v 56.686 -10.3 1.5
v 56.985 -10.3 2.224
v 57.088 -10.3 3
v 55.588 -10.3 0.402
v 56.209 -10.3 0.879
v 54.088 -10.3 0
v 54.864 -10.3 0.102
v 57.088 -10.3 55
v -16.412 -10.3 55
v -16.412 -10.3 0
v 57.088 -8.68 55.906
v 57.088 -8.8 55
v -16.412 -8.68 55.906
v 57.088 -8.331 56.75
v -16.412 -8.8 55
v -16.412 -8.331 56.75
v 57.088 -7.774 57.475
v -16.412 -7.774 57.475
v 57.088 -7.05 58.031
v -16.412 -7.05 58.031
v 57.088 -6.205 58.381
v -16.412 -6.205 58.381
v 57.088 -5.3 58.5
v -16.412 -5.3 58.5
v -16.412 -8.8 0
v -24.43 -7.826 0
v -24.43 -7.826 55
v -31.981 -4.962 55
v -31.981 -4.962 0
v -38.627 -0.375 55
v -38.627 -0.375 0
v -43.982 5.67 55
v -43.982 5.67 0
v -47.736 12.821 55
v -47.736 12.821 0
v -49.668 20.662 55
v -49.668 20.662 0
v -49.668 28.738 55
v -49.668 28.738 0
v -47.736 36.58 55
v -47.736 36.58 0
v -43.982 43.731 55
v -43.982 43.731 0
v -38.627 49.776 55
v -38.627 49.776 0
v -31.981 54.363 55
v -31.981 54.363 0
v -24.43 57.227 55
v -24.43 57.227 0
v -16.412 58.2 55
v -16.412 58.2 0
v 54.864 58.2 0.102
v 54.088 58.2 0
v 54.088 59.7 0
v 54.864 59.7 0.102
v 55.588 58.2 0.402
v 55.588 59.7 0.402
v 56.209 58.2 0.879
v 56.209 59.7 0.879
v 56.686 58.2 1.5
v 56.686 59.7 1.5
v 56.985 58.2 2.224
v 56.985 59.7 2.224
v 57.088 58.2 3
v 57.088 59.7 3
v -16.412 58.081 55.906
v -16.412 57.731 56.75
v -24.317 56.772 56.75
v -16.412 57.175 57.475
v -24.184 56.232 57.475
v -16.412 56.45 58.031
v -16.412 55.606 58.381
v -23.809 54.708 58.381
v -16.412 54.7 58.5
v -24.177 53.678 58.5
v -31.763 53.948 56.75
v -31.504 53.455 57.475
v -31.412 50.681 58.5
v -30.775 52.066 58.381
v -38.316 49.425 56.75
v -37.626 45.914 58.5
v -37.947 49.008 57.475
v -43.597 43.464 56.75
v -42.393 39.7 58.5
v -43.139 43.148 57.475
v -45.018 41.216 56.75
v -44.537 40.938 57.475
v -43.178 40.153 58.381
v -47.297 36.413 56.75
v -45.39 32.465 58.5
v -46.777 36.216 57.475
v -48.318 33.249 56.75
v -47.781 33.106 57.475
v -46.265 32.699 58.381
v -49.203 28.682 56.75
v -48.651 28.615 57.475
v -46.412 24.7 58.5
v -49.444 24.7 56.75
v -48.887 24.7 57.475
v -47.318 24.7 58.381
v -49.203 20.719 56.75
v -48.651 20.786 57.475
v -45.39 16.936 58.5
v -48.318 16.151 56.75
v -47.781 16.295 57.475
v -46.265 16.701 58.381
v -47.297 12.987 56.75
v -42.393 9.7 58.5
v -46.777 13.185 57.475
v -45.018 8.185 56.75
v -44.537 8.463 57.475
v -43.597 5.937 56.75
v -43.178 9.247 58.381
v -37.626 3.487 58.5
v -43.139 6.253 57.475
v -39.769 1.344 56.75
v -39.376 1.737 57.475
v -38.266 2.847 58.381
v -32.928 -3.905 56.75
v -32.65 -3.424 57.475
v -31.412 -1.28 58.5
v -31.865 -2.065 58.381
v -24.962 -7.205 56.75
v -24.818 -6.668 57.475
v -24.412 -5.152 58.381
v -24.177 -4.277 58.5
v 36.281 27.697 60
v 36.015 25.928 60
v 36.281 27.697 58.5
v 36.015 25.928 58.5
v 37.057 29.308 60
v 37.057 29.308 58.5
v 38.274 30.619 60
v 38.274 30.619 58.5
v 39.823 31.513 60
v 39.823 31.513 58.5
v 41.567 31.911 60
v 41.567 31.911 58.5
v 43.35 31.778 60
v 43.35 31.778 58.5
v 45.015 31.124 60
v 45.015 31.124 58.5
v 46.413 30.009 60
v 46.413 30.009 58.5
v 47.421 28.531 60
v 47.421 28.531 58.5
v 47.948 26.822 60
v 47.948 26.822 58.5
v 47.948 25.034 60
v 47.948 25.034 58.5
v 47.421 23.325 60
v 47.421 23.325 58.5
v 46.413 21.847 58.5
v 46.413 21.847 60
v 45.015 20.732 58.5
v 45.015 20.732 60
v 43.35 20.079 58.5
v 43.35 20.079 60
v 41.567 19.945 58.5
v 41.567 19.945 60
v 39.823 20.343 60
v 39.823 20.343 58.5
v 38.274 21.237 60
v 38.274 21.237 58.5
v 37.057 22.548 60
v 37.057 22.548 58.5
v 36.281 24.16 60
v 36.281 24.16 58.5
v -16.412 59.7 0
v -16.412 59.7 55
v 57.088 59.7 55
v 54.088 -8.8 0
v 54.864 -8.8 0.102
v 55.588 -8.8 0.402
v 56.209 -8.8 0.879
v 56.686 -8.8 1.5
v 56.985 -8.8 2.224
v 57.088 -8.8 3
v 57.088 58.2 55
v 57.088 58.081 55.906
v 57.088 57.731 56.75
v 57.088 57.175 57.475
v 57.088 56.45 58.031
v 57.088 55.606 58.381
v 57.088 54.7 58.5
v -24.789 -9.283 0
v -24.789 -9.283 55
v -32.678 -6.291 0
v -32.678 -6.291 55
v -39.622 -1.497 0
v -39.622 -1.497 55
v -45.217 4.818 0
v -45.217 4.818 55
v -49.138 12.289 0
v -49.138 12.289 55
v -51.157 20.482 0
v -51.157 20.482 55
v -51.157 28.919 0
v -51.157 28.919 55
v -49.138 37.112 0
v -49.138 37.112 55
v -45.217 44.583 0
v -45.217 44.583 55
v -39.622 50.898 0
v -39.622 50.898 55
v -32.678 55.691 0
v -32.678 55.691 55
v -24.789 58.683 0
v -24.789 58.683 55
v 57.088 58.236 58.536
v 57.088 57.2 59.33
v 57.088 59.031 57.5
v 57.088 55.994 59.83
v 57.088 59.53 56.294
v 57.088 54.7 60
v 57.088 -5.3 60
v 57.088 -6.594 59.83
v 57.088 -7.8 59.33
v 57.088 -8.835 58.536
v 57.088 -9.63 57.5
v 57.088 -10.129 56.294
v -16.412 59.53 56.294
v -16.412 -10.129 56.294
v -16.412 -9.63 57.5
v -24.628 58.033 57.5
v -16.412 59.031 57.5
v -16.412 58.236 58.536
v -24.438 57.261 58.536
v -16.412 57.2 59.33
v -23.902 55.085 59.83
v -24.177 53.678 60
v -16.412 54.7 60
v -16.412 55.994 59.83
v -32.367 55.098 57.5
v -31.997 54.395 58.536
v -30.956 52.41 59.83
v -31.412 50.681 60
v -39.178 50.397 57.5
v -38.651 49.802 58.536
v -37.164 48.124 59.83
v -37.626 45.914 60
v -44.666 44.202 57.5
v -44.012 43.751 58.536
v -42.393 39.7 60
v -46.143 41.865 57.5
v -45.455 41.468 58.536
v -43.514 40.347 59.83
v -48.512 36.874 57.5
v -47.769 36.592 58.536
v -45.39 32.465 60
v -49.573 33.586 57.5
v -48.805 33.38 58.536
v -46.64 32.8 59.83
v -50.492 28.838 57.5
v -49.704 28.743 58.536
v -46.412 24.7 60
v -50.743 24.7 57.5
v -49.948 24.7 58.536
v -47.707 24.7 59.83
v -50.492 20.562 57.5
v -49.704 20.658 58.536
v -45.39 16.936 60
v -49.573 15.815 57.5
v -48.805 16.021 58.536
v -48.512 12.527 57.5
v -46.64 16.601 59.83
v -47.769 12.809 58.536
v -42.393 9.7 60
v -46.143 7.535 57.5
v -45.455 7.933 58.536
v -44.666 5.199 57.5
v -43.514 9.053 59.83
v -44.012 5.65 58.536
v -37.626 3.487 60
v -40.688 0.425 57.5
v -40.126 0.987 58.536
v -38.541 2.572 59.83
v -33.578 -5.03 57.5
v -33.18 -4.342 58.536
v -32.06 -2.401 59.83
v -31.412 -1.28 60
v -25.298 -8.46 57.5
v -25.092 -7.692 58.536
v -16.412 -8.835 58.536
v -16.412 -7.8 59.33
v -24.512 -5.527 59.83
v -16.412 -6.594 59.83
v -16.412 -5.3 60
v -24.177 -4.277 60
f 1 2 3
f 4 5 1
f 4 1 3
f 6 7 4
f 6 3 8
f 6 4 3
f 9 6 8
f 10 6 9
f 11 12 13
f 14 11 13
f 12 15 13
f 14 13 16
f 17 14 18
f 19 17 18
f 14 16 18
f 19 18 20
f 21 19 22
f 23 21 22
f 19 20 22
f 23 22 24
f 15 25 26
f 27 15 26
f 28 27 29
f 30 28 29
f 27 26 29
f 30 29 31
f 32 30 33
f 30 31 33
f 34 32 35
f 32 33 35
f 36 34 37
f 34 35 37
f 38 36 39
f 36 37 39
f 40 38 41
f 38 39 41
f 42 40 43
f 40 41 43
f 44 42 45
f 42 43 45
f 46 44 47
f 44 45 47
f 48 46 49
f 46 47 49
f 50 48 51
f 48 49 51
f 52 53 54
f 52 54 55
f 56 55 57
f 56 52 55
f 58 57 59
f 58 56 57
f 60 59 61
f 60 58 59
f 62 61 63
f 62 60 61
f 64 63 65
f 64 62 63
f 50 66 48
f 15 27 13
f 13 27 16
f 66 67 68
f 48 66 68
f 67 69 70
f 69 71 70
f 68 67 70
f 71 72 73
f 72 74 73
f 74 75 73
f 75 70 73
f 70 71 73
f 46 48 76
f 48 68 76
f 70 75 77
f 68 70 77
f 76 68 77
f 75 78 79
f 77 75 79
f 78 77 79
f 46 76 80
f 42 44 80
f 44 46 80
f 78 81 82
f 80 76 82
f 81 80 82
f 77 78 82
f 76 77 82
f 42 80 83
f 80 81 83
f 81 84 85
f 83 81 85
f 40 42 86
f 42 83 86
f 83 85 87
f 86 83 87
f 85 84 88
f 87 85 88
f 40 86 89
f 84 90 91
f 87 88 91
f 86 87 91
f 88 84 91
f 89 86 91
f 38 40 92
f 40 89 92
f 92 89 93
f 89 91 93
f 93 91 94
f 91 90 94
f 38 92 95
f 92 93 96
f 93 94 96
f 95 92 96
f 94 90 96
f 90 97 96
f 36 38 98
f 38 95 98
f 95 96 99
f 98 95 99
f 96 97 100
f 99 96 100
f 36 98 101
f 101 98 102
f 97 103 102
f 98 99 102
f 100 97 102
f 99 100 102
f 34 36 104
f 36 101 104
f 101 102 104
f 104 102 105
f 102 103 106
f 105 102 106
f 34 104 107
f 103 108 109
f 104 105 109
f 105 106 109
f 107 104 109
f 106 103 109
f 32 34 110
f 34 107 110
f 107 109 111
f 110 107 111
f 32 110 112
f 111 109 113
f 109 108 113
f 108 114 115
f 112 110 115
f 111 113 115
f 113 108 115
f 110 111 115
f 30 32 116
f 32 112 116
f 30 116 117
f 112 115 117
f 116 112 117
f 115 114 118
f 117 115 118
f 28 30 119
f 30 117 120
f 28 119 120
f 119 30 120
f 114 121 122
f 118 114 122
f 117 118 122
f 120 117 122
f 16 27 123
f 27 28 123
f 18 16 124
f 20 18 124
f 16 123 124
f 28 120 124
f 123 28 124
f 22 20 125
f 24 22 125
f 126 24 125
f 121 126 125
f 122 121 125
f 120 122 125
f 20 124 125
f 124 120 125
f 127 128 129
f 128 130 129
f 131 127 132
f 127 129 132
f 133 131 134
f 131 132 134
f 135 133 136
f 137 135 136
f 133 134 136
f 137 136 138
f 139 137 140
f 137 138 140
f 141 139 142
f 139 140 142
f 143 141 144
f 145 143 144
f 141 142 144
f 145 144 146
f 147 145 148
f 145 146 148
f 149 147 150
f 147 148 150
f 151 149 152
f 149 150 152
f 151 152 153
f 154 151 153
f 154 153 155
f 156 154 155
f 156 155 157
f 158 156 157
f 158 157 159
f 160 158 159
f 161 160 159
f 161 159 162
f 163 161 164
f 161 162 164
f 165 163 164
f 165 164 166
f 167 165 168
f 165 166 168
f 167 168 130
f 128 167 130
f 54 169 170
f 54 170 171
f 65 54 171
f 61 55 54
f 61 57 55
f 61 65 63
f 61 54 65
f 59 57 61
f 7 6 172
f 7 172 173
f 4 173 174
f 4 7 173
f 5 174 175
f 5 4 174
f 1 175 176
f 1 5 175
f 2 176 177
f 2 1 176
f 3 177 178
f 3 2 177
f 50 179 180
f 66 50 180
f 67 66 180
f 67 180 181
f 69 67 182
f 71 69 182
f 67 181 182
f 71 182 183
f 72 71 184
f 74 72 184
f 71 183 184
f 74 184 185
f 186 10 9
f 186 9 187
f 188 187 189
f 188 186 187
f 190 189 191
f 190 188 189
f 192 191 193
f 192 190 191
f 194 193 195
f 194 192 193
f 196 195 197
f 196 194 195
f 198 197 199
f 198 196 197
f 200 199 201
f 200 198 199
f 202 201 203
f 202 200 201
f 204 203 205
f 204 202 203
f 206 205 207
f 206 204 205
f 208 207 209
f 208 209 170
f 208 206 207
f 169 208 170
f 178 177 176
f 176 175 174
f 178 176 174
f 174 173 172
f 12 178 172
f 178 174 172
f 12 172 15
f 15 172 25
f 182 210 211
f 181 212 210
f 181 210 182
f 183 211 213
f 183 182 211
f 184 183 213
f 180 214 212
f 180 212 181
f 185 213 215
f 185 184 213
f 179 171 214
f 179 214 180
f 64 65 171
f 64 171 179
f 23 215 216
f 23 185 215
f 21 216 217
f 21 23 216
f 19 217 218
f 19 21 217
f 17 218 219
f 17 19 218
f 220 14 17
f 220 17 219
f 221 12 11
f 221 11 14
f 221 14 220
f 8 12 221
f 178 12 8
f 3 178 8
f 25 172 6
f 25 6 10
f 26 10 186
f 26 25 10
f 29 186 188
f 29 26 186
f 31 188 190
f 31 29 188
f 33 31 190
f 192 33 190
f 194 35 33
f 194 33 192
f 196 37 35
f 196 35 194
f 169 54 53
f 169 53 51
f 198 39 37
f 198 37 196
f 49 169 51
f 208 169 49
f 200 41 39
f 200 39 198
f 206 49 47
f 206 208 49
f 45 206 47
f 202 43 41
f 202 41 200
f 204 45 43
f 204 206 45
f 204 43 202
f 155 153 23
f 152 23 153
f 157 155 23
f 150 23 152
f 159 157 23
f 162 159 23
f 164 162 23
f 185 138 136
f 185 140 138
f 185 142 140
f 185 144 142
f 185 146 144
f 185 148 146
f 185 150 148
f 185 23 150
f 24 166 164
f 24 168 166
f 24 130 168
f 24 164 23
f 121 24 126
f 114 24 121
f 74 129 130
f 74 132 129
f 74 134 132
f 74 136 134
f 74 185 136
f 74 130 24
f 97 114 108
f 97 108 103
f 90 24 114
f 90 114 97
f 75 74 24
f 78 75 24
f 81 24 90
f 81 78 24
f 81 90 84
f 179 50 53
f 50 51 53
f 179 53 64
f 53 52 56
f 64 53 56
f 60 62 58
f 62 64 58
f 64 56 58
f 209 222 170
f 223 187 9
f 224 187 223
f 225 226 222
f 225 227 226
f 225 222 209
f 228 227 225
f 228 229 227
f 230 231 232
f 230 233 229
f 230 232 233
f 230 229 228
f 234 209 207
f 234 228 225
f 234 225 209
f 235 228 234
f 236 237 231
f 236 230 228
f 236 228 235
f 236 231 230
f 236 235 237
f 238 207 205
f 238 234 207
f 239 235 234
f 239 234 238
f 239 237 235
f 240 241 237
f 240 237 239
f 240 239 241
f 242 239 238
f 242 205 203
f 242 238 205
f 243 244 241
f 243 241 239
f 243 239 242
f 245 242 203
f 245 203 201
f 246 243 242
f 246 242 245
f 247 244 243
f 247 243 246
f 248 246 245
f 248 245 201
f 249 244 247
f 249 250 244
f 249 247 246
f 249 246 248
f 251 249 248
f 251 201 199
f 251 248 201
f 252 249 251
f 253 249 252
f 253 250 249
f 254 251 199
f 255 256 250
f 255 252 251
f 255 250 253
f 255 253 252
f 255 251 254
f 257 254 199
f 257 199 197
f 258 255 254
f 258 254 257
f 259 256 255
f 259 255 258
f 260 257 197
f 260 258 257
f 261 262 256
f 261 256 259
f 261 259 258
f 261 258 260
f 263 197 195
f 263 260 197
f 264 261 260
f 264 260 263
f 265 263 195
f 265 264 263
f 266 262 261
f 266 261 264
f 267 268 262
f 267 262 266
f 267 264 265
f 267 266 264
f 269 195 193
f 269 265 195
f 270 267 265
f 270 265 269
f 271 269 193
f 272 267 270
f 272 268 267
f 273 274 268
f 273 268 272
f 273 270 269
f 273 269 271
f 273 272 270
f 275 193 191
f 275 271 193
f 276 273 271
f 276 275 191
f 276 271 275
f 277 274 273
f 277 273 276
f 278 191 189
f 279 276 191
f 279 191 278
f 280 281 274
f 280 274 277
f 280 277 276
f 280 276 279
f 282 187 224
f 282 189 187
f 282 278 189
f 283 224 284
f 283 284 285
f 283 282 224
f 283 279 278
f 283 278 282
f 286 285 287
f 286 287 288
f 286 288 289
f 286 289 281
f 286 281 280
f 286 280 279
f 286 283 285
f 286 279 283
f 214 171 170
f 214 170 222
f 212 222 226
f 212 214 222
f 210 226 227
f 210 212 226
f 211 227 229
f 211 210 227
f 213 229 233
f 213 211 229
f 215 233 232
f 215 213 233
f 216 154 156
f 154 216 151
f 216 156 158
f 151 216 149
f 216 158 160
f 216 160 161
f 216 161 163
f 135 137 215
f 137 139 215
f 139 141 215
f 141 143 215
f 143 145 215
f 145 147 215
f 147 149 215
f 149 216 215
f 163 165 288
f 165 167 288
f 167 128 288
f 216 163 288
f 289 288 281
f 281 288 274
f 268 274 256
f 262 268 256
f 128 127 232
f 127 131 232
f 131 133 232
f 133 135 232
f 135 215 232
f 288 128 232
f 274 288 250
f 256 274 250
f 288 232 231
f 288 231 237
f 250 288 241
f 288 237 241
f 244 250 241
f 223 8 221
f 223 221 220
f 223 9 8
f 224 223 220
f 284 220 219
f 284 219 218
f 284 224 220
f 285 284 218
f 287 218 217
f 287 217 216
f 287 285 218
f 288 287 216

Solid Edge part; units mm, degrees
sketch "Sketch1" plane through (0, 0, 0) normal (0, 0, 1) x (1, 0, 0)
  line L0 (-16.4125, 59.7004) -> (57.0875, 59.7004)
  line L1 (57.0875, 59.7004) -> (57.0875, -10.2996)
  line L2 (57.0875, -10.2996) -> (-16.4125, -10.2996)
  arc A0 (-16.4125, -10.2996) -> (-16.4125, 59.7004) centre (-16.4125, 24.7004) cw
extrude "Protrusion1" add sketch "Sketch1" along normal blind 60
fillet "Round_1" radius 5 3 edges at (-51.4125, 24.7004, 60) (20.3375, 59.7004, 60) (20.3375, -10.2996, 60)
shell "Thinwall_1" thickness 1.5 removed faces 2 at (57.0875, 48.7337, 49.4) at (40.0892, 2.0671, 0)
sketch "Sketch2" plane through (4.5875, 24.7004, 58.5) normal (0, 0, -1) x (-1, 0, 0)
  circle A0 centre (-37.4274, 1.2277) radius 6
extrude "Cutout1" cut sketch "Sketch2" against normal through all
fillet "Round_2" radius 3 2 edges at (57.0875, -9.5496, 0) (57.0875, 58.9504, 0)
